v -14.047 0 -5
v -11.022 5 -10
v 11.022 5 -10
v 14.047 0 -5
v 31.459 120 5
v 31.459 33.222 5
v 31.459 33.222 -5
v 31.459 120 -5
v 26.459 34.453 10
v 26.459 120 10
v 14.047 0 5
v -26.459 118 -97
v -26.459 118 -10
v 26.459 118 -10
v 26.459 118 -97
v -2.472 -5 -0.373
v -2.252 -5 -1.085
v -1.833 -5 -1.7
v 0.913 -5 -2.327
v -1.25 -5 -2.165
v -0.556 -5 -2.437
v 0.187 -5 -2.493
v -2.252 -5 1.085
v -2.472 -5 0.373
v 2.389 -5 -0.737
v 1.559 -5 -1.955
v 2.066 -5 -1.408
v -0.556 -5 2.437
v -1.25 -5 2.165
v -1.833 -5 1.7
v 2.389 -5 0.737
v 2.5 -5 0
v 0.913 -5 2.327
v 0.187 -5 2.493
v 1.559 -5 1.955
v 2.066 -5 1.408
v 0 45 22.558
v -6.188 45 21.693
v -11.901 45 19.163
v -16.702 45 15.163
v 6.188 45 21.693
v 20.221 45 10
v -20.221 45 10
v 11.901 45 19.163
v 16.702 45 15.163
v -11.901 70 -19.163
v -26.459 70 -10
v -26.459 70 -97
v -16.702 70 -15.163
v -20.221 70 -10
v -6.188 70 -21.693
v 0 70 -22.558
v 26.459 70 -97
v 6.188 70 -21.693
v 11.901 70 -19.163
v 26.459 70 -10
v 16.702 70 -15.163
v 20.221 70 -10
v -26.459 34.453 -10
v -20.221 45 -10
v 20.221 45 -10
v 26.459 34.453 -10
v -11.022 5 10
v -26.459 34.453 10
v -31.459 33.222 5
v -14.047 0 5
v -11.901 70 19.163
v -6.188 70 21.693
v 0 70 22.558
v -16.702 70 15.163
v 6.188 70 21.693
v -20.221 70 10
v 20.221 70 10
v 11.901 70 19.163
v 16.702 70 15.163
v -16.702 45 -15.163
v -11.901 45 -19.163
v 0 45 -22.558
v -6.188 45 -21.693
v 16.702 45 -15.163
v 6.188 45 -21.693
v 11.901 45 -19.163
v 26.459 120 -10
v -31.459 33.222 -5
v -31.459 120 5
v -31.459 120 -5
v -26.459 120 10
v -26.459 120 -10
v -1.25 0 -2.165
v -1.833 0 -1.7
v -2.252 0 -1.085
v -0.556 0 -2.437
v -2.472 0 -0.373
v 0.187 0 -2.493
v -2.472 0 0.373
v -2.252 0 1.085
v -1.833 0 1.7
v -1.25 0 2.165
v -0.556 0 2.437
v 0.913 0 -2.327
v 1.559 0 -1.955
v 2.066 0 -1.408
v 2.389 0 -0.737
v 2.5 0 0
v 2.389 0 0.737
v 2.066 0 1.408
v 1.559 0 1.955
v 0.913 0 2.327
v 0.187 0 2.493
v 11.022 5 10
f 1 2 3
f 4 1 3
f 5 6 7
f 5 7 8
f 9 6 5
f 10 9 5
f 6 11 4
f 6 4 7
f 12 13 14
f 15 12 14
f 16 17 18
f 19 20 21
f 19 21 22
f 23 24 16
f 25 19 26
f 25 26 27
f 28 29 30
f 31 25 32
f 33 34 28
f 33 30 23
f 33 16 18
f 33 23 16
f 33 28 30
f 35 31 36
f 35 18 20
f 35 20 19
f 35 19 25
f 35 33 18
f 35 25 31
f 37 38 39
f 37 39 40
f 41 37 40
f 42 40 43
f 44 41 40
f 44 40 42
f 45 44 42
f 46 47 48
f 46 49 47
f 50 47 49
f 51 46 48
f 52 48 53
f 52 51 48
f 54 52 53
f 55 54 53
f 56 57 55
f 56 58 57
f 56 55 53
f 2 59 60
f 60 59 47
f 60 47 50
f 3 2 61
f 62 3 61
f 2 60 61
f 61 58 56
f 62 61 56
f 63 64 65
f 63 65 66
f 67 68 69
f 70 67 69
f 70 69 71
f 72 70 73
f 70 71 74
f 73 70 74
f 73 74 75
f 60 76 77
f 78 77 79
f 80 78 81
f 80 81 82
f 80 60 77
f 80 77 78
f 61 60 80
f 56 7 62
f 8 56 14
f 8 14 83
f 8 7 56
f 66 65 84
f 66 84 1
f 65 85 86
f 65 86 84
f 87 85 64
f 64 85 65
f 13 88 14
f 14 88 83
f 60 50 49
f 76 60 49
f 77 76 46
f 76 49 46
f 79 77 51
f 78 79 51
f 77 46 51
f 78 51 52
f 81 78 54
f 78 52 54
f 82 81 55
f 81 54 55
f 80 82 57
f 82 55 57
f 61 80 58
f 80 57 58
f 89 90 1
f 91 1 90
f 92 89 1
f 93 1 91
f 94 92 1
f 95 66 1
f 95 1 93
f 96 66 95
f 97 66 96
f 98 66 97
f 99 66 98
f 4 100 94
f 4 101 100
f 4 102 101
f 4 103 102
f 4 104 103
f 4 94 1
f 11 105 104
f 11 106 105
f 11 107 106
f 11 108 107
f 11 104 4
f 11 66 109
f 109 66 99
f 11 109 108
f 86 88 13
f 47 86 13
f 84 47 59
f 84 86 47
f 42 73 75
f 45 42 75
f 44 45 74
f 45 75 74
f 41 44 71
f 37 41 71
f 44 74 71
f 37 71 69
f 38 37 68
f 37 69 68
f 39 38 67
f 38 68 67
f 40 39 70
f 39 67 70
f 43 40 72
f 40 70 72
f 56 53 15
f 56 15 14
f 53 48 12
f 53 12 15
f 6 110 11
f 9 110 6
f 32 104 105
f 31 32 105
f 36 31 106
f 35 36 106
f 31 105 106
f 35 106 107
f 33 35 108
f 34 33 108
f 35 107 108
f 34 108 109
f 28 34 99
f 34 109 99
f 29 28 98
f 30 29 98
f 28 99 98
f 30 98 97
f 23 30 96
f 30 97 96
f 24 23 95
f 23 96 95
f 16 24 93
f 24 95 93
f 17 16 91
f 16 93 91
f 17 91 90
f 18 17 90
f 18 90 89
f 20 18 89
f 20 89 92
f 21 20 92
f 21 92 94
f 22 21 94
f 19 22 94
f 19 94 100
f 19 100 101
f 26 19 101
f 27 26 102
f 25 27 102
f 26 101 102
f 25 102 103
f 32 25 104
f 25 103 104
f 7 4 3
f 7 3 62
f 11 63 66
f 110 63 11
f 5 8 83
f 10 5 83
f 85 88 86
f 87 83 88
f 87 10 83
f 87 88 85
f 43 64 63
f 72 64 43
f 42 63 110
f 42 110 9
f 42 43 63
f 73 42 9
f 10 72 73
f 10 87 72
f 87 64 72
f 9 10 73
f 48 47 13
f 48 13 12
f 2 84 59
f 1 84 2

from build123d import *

# Parameters (mm, degrees)
F0_R     = 2.5
F1_DEPTH = 5
F3_DEPTH = 10
F4_SIZE  = 5
F6_R     = 22.558117
F7_DEPTH = 25
F9_DEPTH = 48


with BuildPart() as f1:
    # F0 (on Front) → F1 (new body)
    with BuildSketch(Plane.XZ):
        Circle(F0_R)
    extrude(amount=F1_DEPTH)

    # F2 (on Top) → F3 (join, symmetric)
    with BuildSketch(Plane.XY):
        Polygon((-14.046734, 0), (0, 0), (14.046734, 0), (31.45878, 33.222206), (31.45878, 120), (0, 120), (-31.45878, 120), (-31.45878, 33.222206), align=None)
    extrude(amount=F3_DEPTH, both=True)

    # F4
    f4_edges = [f1.edges().sort_by_distance(p)[0] for p in [
        (-31.45878, 76.611103, -10),
        (-22.752757, 16.611103, -10),
        (0, 0, -10),
        (22.752757, 16.611103, -10),
        (31.45878, 76.611103, -10),
        (31.45878, 76.611103, 10),
        (22.752757, 16.611103, 10),
        (0, 0, 10),
        (-22.752757, 16.611103, 10),
        (-31.45878, 76.611103, 10),
    ]]
    chamfer(f4_edges, length=F4_SIZE)

    # F6 (on offset) → F7 (join)
    with BuildSketch(Plane.XZ.offset(-70)):
        Circle(F6_R)
    extrude(amount=F7_DEPTH)

    # F8 (on offset) → F9 (join)
    with BuildSketch(Plane.XZ.offset(-70)):
        Polygon((26.45878, -97), (26.45878, -10), (0, -10), (-26.45878, -10), (-26.45878, -97), (0, -97), align=None)
    extrude(amount=-F9_DEPTH)


solid = f1.part
